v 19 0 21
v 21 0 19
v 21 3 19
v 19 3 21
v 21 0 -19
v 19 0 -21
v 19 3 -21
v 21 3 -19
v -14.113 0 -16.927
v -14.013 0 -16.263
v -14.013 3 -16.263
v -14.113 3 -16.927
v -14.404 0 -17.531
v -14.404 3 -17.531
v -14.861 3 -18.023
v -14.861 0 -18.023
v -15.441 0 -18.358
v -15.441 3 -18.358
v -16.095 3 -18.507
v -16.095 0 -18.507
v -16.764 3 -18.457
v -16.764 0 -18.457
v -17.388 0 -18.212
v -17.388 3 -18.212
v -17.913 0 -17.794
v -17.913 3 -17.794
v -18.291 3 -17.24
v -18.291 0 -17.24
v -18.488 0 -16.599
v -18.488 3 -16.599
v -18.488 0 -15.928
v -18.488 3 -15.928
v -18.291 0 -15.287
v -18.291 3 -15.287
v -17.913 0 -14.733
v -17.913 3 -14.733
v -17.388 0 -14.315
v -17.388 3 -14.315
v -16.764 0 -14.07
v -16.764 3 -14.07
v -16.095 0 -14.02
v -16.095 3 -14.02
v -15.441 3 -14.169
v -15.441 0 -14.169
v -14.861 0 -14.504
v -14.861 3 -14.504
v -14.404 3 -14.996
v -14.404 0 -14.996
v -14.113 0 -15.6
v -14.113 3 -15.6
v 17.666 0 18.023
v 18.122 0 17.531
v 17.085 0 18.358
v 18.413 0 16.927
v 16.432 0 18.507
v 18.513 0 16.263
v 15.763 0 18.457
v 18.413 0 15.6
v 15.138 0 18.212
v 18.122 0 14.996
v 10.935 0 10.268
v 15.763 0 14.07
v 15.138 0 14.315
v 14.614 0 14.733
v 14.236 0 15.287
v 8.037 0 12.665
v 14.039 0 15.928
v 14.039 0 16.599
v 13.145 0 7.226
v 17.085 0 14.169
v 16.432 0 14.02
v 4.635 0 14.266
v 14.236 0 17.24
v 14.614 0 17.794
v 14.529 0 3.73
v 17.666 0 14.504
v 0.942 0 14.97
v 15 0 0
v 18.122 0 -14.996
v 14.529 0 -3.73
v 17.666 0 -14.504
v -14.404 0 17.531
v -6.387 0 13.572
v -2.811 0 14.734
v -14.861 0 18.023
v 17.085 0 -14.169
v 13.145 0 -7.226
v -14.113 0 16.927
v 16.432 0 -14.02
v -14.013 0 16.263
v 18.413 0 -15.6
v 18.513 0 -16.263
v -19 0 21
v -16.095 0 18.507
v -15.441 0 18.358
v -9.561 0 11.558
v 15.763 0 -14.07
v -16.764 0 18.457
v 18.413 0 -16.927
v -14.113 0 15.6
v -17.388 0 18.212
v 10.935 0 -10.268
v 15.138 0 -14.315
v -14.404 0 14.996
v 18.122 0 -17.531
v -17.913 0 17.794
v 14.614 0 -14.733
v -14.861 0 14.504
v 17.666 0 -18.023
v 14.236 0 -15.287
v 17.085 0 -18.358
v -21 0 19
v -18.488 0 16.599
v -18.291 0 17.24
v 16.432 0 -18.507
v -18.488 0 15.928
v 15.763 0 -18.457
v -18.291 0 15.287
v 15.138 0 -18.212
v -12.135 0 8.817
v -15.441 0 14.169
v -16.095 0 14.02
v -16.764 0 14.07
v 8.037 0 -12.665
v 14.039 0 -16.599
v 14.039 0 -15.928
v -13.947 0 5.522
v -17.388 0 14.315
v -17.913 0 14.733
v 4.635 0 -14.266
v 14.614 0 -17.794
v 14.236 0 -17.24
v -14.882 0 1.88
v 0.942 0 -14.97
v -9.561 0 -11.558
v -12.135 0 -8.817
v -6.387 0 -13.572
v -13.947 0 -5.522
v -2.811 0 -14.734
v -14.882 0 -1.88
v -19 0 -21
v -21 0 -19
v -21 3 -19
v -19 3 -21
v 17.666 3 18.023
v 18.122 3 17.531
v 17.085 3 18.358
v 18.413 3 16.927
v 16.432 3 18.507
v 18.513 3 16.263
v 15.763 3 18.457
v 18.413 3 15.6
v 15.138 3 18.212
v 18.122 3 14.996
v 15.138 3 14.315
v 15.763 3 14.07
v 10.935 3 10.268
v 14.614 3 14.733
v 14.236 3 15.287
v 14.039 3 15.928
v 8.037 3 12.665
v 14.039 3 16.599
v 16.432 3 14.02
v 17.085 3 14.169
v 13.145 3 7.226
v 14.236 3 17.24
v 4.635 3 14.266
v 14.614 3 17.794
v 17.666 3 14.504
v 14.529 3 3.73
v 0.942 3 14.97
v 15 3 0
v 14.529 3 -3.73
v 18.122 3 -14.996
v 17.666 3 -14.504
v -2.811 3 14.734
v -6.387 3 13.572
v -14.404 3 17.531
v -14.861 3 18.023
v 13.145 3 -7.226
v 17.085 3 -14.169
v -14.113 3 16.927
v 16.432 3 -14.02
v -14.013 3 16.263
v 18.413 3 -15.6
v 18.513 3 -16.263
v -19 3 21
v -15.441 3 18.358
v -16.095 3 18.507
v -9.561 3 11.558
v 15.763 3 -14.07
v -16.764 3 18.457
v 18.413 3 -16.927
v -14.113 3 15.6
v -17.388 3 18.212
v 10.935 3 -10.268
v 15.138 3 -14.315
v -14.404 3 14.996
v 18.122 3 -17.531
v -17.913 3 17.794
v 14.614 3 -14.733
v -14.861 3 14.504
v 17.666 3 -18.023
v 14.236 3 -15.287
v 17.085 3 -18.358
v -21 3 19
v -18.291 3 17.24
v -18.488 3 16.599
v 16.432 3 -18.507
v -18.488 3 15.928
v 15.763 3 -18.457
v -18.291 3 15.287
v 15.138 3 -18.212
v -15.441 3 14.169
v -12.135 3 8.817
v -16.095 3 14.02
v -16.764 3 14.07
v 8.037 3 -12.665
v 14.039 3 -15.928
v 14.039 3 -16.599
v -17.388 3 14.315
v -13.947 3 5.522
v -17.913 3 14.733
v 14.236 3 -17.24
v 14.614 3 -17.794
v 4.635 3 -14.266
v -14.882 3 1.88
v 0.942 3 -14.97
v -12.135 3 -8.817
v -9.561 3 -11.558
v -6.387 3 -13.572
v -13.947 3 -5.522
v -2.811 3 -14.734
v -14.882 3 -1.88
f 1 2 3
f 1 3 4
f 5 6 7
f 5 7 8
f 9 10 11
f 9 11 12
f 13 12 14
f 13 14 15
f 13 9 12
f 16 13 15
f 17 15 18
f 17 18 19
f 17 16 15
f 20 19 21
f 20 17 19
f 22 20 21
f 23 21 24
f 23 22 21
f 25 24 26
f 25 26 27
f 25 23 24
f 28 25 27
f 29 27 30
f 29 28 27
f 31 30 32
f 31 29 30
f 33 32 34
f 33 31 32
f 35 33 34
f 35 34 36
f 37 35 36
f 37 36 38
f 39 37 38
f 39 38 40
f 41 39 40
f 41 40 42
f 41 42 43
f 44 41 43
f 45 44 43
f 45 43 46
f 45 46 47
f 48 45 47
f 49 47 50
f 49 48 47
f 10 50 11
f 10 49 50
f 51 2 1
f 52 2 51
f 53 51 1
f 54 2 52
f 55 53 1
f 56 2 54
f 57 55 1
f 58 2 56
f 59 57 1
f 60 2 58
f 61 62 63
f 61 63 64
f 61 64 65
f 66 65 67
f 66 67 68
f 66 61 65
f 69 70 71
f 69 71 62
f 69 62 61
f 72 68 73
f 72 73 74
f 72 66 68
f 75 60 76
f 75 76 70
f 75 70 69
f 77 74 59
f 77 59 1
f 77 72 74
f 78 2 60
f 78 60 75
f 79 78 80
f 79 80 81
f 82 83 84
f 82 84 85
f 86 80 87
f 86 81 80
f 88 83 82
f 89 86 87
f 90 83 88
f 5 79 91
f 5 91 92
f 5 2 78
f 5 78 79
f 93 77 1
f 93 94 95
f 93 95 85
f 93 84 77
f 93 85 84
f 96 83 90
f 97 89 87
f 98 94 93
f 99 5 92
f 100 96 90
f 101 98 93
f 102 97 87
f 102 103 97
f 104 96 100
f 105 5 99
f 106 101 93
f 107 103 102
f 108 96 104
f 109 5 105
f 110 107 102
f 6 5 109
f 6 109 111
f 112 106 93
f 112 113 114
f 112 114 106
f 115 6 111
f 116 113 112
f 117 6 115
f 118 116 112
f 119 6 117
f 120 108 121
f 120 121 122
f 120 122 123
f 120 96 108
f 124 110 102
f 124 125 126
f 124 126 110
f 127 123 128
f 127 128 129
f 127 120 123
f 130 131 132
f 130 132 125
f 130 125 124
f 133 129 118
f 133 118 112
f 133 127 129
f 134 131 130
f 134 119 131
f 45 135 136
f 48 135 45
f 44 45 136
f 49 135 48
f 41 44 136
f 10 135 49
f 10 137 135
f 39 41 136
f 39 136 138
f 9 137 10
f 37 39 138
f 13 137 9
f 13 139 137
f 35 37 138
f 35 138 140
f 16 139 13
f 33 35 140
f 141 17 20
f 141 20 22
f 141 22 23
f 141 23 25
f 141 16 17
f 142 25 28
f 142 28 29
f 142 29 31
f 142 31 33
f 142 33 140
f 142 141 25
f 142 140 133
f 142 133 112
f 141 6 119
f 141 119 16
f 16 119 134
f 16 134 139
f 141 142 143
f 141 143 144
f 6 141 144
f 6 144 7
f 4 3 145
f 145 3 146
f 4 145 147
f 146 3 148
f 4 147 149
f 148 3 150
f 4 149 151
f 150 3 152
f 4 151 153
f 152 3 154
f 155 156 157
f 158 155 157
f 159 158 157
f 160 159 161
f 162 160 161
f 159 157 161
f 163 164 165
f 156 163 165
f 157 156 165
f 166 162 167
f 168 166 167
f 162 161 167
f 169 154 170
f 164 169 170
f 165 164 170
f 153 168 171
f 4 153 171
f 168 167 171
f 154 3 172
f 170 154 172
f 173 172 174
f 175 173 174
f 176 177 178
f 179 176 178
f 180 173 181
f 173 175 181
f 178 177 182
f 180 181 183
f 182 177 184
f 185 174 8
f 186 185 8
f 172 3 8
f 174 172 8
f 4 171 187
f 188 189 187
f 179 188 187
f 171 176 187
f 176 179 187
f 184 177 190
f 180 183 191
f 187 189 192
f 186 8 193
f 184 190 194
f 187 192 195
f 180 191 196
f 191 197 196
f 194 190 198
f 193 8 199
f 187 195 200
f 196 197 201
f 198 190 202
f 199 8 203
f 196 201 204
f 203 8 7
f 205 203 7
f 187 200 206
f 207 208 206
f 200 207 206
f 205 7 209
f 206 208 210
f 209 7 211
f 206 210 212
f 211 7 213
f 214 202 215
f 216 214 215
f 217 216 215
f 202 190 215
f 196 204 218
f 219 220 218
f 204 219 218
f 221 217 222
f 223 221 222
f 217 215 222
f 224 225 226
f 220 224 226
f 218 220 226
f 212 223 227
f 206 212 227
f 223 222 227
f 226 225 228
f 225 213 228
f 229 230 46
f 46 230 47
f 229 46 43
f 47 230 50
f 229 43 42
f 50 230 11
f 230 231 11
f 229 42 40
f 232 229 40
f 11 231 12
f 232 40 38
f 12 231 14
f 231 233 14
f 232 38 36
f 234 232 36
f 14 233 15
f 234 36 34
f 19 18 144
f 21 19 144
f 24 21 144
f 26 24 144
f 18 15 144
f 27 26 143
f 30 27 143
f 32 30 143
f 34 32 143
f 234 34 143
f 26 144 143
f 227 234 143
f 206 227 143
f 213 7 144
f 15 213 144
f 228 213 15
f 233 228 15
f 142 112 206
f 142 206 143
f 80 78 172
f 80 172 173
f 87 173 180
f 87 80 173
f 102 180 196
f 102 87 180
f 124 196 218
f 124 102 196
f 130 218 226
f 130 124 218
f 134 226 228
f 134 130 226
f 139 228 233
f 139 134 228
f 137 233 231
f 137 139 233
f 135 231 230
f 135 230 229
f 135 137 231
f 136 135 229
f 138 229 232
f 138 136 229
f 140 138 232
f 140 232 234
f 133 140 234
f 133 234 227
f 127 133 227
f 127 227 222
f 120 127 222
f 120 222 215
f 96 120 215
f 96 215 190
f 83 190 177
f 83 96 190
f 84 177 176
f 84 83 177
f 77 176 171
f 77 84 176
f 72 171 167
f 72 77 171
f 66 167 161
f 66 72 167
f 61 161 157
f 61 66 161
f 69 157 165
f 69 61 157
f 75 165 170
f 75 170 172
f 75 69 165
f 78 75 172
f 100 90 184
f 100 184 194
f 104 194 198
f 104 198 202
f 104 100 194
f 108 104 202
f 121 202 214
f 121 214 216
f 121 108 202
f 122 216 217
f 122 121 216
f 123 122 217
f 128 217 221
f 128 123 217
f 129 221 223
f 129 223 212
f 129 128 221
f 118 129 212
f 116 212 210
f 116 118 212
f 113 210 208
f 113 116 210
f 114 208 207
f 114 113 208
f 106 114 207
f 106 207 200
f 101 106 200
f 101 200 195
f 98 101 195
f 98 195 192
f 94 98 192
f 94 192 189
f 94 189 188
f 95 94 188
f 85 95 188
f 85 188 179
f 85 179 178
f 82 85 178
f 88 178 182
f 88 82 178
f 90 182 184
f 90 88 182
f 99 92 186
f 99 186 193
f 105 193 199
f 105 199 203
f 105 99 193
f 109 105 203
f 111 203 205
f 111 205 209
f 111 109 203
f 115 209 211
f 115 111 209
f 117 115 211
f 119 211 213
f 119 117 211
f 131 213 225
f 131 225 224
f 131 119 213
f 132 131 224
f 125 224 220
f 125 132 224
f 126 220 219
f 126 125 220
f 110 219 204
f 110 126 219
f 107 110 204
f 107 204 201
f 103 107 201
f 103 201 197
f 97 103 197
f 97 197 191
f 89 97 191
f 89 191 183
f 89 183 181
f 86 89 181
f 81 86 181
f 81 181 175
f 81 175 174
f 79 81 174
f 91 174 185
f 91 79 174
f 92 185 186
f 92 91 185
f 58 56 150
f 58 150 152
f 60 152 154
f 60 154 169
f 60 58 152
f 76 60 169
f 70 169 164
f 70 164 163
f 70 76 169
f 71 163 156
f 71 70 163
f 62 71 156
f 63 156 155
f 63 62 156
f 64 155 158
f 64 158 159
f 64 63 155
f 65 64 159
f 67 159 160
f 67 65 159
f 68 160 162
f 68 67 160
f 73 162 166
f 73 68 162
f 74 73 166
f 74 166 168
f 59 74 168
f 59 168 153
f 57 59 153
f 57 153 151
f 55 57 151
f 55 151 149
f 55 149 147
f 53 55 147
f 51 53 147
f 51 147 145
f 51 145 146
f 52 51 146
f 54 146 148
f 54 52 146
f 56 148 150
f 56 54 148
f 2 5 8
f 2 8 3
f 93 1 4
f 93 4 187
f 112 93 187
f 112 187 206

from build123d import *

# Parameters (mm, degrees)
SKETCH1_R           = 2.25
SKETCH1_R_2         = 15
BOSS_EXTRUDE1_DEPTH = 3


with BuildPart() as part:
    # Sketch1 → Boss-Extrude1 (new body)
    with BuildSketch(Plane(origin=(0, 0, 0), x_dir=(1, 0, 0), z_dir=(0, 1, 0))):
        Polygon((19, 21), (21, 19), (21, -19), (19, -21), (-19, -21), (-21, -19), (-21, 19), (-19, 21), align=None)
        with Locations((-16.263455967, 16.263455967)):
            Circle(SKETCH1_R, mode=Mode.SUBTRACT)
        with Locations((16.263455967, 16.263455967)):
            Circle(SKETCH1_R, mode=Mode.SUBTRACT)
        with Locations((16.263455967, -16.263455967)):
            Circle(SKETCH1_R, mode=Mode.SUBTRACT)
        with Locations((-16.263455967, -16.263455967)):
            Circle(SKETCH1_R, mode=Mode.SUBTRACT)
        Circle(SKETCH1_R_2, mode=Mode.SUBTRACT)
    extrude(amount=BOSS_EXTRUDE1_DEPTH)


solid = part.part
